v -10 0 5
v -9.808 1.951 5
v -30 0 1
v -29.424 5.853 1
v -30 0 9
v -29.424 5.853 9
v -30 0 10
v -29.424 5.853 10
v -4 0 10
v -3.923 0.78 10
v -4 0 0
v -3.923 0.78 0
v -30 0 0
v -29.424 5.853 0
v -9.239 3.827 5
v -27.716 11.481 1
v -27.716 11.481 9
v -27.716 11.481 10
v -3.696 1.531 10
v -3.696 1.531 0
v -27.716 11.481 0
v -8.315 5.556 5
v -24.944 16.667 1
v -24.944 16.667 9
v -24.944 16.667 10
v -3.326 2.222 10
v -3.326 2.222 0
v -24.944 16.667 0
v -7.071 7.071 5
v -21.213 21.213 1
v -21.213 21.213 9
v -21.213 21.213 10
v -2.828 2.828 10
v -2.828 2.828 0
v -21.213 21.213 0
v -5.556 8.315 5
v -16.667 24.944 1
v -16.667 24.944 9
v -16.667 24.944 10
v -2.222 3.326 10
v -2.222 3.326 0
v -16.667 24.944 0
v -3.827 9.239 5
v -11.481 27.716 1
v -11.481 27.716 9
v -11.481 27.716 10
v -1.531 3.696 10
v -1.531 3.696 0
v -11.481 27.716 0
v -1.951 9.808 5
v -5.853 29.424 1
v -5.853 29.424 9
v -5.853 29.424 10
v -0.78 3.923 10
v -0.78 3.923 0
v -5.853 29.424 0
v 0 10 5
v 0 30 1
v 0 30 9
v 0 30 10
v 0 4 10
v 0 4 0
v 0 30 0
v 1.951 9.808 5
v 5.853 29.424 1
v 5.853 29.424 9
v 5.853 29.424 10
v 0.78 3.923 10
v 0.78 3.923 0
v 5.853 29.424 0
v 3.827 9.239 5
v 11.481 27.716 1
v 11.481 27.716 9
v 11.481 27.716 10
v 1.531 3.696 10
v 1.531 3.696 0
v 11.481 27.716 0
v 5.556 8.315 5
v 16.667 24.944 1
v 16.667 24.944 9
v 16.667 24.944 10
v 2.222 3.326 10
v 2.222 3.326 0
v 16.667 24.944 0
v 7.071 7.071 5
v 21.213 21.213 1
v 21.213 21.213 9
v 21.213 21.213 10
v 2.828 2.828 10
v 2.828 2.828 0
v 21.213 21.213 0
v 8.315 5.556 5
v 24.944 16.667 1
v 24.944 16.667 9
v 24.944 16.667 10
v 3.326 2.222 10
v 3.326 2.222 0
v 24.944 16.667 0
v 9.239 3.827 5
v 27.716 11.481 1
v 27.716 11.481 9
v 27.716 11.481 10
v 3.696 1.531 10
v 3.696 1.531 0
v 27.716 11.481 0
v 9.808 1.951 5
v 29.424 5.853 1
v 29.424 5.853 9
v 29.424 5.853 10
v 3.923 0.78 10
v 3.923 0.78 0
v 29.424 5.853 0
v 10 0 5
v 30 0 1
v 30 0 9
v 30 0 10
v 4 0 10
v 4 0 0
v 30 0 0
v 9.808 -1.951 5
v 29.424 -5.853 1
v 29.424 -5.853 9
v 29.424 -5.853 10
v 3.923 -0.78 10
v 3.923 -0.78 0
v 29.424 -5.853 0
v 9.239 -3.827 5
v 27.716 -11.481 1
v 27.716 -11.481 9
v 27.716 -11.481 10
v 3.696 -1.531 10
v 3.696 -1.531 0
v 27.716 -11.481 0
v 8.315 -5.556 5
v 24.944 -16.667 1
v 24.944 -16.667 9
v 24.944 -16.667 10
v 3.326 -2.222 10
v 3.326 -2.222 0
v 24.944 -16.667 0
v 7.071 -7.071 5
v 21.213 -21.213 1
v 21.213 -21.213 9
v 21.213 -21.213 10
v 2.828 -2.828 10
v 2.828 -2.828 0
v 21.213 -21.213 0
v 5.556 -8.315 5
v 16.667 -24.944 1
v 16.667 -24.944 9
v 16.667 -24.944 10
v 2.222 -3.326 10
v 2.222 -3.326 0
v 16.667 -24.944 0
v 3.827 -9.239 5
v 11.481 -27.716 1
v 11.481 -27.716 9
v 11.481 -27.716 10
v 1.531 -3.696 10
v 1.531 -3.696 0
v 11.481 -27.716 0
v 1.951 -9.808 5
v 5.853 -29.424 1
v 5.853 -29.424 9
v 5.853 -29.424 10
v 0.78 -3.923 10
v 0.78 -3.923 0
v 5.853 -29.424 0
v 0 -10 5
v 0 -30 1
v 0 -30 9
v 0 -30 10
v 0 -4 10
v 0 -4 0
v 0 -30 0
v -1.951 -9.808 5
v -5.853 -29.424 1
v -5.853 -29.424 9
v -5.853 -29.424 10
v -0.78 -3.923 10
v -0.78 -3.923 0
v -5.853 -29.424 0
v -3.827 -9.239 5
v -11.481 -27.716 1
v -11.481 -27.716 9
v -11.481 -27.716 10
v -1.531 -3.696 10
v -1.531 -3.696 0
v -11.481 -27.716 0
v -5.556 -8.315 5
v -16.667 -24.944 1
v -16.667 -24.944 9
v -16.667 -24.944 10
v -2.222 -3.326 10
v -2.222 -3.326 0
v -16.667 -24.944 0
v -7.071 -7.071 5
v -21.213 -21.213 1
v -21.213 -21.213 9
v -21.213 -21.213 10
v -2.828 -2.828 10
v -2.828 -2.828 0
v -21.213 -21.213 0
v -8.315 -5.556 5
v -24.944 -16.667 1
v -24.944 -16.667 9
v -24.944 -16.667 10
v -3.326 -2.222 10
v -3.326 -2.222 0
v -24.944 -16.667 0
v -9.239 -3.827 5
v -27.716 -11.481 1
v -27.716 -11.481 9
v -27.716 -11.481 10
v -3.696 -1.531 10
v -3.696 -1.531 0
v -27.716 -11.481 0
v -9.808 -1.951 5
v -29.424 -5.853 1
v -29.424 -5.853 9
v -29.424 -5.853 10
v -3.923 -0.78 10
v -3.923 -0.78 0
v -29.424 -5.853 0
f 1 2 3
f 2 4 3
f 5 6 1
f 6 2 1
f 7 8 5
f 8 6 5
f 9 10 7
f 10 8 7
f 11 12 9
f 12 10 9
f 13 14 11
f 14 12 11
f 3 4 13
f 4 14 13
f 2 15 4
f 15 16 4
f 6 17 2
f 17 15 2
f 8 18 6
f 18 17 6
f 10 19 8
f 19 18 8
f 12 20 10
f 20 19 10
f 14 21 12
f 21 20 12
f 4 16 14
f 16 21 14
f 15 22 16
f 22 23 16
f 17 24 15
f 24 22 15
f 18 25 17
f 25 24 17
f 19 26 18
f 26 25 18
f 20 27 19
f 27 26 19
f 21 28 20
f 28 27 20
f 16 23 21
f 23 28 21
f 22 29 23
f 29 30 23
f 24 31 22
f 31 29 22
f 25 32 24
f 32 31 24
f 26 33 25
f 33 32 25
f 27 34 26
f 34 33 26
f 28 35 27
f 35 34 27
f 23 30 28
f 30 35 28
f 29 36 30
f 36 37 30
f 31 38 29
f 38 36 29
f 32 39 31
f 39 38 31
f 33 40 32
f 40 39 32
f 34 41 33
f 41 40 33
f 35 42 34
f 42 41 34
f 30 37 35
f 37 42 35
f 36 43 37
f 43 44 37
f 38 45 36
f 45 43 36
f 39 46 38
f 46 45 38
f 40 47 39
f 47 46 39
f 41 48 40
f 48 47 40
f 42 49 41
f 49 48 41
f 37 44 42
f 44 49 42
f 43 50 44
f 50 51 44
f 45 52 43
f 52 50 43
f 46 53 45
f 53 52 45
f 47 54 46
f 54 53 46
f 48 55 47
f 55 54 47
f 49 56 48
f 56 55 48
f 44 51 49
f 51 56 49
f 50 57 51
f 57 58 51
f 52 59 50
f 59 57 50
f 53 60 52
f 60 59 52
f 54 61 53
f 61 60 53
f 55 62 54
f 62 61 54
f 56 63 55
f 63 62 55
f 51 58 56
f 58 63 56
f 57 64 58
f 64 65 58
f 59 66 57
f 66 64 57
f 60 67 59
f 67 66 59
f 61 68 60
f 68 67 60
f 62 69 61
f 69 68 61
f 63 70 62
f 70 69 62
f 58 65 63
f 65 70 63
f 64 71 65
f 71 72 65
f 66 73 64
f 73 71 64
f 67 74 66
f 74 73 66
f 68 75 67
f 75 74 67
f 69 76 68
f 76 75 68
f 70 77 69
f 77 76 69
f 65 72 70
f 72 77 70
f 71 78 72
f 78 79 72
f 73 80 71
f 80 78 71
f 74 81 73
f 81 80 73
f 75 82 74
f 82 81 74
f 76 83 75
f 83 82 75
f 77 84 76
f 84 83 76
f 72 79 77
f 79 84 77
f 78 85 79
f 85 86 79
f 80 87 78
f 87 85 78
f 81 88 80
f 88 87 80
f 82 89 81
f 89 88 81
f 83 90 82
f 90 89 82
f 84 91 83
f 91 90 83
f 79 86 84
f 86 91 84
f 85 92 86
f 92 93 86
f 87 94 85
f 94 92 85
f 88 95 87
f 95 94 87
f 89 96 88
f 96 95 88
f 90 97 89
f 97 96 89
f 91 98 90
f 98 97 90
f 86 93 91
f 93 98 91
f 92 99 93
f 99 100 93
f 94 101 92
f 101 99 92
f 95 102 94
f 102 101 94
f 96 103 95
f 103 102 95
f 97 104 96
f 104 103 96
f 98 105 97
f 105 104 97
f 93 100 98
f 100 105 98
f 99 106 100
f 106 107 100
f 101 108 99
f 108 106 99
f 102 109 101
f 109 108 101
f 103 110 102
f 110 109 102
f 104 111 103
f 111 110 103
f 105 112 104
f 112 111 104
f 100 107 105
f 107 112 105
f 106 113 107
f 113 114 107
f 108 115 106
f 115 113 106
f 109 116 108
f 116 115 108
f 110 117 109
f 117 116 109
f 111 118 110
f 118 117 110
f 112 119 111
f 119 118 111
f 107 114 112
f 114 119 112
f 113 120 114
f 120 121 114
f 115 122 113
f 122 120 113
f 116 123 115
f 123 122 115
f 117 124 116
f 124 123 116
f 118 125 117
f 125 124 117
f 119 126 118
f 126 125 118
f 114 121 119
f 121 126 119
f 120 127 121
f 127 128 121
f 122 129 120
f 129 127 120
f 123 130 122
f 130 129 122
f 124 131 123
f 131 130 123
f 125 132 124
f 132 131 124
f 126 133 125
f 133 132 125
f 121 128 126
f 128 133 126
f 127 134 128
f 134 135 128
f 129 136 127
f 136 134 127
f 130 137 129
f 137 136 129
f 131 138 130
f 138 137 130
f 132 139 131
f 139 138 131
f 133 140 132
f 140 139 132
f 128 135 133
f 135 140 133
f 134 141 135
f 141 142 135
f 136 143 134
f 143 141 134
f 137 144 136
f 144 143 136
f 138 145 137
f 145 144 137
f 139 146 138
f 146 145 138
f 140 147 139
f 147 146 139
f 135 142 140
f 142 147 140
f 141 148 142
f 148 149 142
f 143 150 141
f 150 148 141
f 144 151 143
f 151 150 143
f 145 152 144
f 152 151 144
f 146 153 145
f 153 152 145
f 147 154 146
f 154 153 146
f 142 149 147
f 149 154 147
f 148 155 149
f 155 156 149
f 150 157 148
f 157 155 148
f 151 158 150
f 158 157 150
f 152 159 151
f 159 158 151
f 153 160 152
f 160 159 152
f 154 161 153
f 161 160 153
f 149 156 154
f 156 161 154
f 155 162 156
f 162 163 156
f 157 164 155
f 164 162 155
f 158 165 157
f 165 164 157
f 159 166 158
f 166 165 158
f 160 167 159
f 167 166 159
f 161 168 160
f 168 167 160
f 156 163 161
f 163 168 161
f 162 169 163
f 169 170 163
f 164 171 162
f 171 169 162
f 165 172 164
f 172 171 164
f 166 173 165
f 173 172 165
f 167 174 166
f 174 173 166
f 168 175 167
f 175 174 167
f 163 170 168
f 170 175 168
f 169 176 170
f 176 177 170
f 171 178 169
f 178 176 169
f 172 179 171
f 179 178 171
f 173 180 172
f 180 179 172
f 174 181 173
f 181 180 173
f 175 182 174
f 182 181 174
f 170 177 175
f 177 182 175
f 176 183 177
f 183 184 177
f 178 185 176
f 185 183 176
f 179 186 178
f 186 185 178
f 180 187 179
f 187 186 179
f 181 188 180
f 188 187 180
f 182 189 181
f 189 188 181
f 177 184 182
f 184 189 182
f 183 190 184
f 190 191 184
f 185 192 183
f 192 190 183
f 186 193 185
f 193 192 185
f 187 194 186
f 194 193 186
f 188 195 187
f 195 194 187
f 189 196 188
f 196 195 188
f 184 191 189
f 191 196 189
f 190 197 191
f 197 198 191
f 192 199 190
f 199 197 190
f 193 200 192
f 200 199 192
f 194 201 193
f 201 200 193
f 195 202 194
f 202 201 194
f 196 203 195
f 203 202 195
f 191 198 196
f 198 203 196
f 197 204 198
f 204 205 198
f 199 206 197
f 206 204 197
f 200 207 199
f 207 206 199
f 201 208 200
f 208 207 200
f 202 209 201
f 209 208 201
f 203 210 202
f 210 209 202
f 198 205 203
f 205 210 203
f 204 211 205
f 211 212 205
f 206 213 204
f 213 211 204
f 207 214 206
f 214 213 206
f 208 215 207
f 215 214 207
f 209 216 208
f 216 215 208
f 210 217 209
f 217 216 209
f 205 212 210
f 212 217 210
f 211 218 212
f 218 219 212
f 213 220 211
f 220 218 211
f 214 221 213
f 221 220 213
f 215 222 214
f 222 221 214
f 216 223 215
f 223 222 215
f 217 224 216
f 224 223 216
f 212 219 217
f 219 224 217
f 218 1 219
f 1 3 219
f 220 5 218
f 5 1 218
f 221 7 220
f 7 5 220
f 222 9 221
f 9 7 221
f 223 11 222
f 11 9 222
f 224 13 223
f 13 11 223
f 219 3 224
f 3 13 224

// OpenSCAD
$fn = 32;

// ----------------------------------------------------------------------
// Revolved part: V-groove pulley R30
// ----------------------------------------------------------------------

// --- parameters (mm) ---
bore_r = 4;               // bore radius
rim_r = 30;               // rim radius
rim_t = 10;               // rim width
groove_r = 10;            // groove root radius
groove_w = 4;             // groove half width
revolve_angle = 360;      // revolve sweep, degrees

bore_d = 2 * bore_r;
rim_d = 2 * rim_r;
groove_d = 2 * groove_r;

profile = [[4, 0], [30, 0], [30, 1], [10, 5], [30, 9], [30, 10], [4, 10]];  // primary outline, 7 points, counter clockwise

// --- the one profile operation ---
rotate_extrude(angle = revolve_angle) polygon(points = profile);
